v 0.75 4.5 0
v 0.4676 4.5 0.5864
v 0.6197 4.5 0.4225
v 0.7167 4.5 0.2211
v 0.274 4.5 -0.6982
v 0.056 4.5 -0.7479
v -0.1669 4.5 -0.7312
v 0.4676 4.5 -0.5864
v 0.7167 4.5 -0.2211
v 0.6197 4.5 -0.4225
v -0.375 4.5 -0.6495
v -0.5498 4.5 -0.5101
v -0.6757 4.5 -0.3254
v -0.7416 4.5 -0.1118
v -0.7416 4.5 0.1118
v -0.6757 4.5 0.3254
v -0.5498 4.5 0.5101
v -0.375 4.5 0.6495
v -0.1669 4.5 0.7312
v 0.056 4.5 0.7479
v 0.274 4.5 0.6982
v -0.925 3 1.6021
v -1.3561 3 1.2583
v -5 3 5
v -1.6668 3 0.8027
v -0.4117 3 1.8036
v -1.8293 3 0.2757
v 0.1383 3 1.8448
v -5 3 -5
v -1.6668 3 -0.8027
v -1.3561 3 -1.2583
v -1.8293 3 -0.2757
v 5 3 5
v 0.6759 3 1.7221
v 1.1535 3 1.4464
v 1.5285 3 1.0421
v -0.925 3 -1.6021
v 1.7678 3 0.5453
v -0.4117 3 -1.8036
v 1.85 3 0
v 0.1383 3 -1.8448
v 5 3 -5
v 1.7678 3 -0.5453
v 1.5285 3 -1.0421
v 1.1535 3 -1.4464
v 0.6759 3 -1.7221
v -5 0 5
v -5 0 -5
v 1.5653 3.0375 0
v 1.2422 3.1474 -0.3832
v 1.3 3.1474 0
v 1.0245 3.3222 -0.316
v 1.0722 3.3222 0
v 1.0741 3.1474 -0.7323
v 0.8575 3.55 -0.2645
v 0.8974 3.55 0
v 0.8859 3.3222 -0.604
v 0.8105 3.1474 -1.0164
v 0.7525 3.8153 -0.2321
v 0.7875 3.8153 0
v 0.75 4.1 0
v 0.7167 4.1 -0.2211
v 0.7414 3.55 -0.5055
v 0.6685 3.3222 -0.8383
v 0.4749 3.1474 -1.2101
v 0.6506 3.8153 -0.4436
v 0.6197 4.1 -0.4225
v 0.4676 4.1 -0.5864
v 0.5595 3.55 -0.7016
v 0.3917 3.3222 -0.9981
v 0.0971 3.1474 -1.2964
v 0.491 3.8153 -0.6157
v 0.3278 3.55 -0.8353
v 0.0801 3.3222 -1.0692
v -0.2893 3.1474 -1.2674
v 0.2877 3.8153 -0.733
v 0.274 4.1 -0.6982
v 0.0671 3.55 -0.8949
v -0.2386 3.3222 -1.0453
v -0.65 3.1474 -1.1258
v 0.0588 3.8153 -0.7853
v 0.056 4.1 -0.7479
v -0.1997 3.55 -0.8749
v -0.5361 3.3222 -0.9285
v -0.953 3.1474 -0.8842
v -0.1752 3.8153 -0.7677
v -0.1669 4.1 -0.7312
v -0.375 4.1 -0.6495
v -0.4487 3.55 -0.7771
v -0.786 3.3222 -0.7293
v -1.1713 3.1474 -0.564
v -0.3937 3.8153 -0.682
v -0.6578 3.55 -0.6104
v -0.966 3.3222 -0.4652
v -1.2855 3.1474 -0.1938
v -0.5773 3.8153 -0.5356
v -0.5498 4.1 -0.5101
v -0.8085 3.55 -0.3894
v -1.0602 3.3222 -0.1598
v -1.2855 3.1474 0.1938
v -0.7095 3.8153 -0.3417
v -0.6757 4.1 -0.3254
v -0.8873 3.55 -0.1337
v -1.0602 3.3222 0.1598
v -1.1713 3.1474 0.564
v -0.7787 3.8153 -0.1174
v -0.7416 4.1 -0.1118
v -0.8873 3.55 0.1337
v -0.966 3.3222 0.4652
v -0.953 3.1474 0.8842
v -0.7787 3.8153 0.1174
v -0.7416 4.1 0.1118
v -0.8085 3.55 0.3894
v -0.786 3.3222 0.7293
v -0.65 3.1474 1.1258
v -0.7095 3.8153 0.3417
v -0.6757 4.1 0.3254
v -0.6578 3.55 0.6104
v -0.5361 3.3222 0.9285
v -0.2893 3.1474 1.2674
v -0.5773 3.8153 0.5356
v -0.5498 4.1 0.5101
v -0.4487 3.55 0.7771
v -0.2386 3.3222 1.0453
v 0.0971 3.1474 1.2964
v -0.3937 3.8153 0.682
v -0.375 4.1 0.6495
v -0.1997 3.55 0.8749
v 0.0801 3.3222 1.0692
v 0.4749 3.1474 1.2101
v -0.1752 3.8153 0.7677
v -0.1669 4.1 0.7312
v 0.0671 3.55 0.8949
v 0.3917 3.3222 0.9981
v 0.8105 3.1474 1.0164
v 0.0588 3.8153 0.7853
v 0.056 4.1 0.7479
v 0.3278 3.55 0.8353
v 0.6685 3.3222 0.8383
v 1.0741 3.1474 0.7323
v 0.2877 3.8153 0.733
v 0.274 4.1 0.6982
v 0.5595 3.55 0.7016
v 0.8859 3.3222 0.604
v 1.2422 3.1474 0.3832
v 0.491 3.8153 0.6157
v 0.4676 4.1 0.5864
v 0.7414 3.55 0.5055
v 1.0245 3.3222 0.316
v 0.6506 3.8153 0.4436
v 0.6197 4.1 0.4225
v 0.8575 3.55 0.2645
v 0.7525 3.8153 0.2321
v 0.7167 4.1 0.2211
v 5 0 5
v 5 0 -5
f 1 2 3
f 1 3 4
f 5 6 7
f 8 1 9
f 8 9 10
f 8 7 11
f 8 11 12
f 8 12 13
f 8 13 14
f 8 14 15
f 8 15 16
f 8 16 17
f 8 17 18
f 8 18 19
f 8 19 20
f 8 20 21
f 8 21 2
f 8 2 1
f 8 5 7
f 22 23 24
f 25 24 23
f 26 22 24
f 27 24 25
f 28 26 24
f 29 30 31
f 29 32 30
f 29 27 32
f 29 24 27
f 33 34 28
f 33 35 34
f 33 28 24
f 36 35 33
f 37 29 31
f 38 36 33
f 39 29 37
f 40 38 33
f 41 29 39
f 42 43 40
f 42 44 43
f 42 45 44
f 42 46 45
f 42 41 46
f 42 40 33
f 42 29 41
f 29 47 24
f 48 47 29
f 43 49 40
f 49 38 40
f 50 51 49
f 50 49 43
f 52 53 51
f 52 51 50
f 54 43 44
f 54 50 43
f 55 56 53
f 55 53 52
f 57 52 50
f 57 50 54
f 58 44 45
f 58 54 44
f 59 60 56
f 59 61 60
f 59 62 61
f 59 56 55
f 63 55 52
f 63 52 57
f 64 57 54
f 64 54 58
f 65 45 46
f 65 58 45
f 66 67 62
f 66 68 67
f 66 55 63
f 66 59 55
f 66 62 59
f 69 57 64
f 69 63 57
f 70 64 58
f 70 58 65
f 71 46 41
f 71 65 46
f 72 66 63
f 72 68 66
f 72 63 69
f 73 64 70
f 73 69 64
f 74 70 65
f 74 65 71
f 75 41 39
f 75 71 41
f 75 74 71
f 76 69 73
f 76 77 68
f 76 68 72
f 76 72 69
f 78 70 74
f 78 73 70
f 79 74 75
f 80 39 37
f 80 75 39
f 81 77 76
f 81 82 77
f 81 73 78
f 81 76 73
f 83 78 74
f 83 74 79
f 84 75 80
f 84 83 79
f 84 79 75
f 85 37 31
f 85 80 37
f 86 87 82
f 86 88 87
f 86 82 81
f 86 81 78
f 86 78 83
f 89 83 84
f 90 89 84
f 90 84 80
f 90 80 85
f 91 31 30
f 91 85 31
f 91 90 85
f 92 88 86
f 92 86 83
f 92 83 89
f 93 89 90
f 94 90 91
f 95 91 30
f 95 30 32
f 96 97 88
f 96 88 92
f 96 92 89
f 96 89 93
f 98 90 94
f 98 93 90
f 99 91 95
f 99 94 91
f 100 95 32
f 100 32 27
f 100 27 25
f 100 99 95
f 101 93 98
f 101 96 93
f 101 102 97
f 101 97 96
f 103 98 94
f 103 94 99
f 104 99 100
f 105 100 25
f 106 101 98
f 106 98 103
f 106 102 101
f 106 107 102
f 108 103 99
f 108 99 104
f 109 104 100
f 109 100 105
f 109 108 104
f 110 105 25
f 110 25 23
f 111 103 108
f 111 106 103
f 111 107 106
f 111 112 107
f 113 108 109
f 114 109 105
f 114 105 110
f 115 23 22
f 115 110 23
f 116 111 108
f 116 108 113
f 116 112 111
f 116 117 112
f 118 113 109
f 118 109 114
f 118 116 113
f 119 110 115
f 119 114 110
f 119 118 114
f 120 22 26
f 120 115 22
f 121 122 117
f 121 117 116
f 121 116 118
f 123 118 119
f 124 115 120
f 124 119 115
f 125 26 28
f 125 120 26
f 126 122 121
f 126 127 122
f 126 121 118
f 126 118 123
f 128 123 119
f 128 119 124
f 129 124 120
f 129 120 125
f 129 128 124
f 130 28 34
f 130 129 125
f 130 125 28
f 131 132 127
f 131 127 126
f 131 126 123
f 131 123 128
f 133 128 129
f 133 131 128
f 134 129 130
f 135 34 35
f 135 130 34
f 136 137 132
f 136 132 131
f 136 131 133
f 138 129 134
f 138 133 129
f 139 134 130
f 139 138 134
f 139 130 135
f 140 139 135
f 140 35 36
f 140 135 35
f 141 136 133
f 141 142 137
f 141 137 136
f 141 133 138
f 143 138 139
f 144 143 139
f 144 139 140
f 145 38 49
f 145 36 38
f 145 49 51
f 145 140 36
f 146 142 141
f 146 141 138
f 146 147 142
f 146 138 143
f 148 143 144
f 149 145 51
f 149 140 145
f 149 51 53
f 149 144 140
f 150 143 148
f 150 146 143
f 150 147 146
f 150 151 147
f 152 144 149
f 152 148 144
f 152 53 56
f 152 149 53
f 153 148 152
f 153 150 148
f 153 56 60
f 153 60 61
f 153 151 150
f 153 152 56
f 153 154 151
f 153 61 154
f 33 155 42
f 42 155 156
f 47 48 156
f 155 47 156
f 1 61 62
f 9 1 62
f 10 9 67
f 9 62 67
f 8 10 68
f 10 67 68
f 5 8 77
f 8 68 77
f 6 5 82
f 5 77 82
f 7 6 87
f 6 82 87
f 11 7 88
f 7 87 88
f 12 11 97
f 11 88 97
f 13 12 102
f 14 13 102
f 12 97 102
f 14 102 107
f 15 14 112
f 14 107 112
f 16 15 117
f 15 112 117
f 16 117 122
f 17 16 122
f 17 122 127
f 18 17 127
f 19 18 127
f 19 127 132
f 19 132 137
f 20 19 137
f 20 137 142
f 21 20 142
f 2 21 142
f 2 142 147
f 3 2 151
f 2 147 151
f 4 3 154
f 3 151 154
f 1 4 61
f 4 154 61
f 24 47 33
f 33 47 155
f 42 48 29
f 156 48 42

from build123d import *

# Parameters (mm, degrees)
SKETCH_1_W      = 10
SKETCH_1_H      = 10
EXTRUDE_1_DEPTH = 3
SKETCH_2_R      = 0.75
EXTRUDE_2_DEPTH = 1.5
FILLET_1_R      = 1.1


with BuildPart() as part:
    # 草图1 → 凸台-拉伸1 (new body)
    with BuildSketch(Plane(origin=(0, 0, 0), x_dir=(1, 0, 0), z_dir=(0, 1, 0))):
        Rectangle(SKETCH_1_W, SKETCH_1_H)
    extrude(amount=EXTRUDE_1_DEPTH)

    # 草图2 → 凸台-拉伸2 (add)
    with BuildSketch(Plane(origin=(0, 3, 0), x_dir=(1, 0, 0), z_dir=(0, 1, 0))):
        Circle(SKETCH_2_R)
    extrude(amount=EXTRUDE_2_DEPTH)

    # 圆角1
    fillet_1_edges = [part.edges().sort_by_distance(p)[0] for p in [
        (-0.75, 3, 0),
    ]]
    fillet(fillet_1_edges, radius=FILLET_1_R)


solid = part.part
